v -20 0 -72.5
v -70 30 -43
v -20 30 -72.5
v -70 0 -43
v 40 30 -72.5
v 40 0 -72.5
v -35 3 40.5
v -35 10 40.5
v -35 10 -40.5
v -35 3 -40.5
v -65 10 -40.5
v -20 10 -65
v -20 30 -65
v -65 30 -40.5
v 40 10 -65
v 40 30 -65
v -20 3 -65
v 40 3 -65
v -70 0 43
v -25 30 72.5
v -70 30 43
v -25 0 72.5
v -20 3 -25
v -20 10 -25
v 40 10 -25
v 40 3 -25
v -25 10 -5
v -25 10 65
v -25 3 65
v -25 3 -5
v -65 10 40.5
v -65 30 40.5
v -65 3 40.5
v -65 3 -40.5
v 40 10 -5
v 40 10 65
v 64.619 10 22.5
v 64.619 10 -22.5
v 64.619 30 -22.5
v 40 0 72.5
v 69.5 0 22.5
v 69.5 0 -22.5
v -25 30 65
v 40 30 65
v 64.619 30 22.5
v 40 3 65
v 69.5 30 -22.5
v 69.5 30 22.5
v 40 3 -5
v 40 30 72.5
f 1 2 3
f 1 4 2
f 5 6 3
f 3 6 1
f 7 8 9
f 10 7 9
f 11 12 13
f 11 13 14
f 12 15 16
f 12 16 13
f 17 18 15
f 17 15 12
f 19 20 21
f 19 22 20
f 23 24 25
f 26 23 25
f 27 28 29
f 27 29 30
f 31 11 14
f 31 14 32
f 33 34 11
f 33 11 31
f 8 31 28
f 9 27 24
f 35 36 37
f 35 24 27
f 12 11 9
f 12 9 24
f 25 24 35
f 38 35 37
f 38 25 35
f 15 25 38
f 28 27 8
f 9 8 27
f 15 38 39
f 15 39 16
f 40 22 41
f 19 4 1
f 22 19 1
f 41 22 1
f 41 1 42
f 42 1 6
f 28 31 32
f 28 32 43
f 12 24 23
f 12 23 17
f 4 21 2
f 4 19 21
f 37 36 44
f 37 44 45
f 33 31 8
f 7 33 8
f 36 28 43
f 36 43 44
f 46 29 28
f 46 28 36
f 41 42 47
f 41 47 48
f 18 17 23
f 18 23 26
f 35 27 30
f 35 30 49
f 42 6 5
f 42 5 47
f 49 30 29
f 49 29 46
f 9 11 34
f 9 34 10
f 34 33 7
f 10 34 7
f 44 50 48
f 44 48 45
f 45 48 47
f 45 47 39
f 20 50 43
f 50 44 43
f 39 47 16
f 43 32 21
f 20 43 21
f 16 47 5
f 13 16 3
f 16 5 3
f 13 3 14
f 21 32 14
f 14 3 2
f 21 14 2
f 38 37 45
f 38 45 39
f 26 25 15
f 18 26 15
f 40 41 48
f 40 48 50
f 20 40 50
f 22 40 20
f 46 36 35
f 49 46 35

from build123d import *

# Parameters (mm, degrees)
SKETCH1_R           = 85
BOSS_EXTRUDE2_DEPTH = 10
SKETCH3_W           = 30
SKETCH3_H           = 81
SKETCH3_W_2         = 60
SKETCH3_H_2         = 40
SKETCH3_W_3         = 65
SKETCH3_H_3         = 70
CUT_EXTRUDE2_DEPTH  = 7
SKETCH5_W           = 194.063046405
SKETCH5_H           = 184.49419377
CUT_EXTRUDE4_DEPTH  = 10
BOSS_EXTRUDE3_DEPTH = 20


with BuildPart() as part:
    # Sketch1 → Boss-Extrude2 (new body)
    with BuildSketch(Plane(origin=(0, 0, 0), x_dir=(1, 0, 0), z_dir=(0, 1, 0))):
        Circle(SKETCH1_R)
    extrude(amount=BOSS_EXTRUDE2_DEPTH)

    # Sketch3 → Cut-Extrude2 (cut)
    with BuildSketch(Plane(origin=(0, 10, 0), x_dir=(1, 0, 0), z_dir=(0, 1, 0))):
        with Locations((-50, 0)):
            Rectangle(SKETCH3_W, SKETCH3_H)
        with Locations((10, 45)):
            Rectangle(SKETCH3_W_2, SKETCH3_H_2)
        with Locations((7.5, -30)):
            Rectangle(SKETCH3_W_3, SKETCH3_H_3)
    extrude(amount=-CUT_EXTRUDE2_DEPTH, mode=Mode.SUBTRACT)

    # Sketch5 → Cut-Extrude4 (cut)
    with BuildSketch(Plane(origin=(0, 10, 0), x_dir=(1, 0, 0), z_dir=(0, 1, 0))):
        with Locations((-1.510871468, -0.083937304)):
            Rectangle(SKETCH5_W, SKETCH5_H)
        Polygon((-70, 43), (-20, 72.5), (40, 72.5), (69.5, 22.5), (69.5, -22.5), (40, -72.5), (-25, -72.5), (-70, -43), align=None, mode=Mode.SUBTRACT)
    extrude(amount=-CUT_EXTRUDE4_DEPTH, mode=Mode.SUBTRACT)

    # Sketch6 → Boss-Extrude3 (add)
    with BuildSketch(Plane(origin=(0, 10, 0), x_dir=(1, 0, 0), z_dir=(0, 1, 0))):
        Polygon((-70, 43), (-20, 72.5), (38.257502672, 72.5), (40, 72.5), (69.5, 22.5), (69.5, -22.5), (40, -72.5), (-25, -72.5), (-70, -43), align=None)
        Polygon((-65, 40.5), (-65, -40.5), (-25, -65), (40, -65), (64.618640633, -22.5), (64.618640633, 22.5), (40, 65), (-20, 65), align=None, mode=Mode.SUBTRACT)
    extrude(amount=BOSS_EXTRUDE3_DEPTH)


solid = part.part
